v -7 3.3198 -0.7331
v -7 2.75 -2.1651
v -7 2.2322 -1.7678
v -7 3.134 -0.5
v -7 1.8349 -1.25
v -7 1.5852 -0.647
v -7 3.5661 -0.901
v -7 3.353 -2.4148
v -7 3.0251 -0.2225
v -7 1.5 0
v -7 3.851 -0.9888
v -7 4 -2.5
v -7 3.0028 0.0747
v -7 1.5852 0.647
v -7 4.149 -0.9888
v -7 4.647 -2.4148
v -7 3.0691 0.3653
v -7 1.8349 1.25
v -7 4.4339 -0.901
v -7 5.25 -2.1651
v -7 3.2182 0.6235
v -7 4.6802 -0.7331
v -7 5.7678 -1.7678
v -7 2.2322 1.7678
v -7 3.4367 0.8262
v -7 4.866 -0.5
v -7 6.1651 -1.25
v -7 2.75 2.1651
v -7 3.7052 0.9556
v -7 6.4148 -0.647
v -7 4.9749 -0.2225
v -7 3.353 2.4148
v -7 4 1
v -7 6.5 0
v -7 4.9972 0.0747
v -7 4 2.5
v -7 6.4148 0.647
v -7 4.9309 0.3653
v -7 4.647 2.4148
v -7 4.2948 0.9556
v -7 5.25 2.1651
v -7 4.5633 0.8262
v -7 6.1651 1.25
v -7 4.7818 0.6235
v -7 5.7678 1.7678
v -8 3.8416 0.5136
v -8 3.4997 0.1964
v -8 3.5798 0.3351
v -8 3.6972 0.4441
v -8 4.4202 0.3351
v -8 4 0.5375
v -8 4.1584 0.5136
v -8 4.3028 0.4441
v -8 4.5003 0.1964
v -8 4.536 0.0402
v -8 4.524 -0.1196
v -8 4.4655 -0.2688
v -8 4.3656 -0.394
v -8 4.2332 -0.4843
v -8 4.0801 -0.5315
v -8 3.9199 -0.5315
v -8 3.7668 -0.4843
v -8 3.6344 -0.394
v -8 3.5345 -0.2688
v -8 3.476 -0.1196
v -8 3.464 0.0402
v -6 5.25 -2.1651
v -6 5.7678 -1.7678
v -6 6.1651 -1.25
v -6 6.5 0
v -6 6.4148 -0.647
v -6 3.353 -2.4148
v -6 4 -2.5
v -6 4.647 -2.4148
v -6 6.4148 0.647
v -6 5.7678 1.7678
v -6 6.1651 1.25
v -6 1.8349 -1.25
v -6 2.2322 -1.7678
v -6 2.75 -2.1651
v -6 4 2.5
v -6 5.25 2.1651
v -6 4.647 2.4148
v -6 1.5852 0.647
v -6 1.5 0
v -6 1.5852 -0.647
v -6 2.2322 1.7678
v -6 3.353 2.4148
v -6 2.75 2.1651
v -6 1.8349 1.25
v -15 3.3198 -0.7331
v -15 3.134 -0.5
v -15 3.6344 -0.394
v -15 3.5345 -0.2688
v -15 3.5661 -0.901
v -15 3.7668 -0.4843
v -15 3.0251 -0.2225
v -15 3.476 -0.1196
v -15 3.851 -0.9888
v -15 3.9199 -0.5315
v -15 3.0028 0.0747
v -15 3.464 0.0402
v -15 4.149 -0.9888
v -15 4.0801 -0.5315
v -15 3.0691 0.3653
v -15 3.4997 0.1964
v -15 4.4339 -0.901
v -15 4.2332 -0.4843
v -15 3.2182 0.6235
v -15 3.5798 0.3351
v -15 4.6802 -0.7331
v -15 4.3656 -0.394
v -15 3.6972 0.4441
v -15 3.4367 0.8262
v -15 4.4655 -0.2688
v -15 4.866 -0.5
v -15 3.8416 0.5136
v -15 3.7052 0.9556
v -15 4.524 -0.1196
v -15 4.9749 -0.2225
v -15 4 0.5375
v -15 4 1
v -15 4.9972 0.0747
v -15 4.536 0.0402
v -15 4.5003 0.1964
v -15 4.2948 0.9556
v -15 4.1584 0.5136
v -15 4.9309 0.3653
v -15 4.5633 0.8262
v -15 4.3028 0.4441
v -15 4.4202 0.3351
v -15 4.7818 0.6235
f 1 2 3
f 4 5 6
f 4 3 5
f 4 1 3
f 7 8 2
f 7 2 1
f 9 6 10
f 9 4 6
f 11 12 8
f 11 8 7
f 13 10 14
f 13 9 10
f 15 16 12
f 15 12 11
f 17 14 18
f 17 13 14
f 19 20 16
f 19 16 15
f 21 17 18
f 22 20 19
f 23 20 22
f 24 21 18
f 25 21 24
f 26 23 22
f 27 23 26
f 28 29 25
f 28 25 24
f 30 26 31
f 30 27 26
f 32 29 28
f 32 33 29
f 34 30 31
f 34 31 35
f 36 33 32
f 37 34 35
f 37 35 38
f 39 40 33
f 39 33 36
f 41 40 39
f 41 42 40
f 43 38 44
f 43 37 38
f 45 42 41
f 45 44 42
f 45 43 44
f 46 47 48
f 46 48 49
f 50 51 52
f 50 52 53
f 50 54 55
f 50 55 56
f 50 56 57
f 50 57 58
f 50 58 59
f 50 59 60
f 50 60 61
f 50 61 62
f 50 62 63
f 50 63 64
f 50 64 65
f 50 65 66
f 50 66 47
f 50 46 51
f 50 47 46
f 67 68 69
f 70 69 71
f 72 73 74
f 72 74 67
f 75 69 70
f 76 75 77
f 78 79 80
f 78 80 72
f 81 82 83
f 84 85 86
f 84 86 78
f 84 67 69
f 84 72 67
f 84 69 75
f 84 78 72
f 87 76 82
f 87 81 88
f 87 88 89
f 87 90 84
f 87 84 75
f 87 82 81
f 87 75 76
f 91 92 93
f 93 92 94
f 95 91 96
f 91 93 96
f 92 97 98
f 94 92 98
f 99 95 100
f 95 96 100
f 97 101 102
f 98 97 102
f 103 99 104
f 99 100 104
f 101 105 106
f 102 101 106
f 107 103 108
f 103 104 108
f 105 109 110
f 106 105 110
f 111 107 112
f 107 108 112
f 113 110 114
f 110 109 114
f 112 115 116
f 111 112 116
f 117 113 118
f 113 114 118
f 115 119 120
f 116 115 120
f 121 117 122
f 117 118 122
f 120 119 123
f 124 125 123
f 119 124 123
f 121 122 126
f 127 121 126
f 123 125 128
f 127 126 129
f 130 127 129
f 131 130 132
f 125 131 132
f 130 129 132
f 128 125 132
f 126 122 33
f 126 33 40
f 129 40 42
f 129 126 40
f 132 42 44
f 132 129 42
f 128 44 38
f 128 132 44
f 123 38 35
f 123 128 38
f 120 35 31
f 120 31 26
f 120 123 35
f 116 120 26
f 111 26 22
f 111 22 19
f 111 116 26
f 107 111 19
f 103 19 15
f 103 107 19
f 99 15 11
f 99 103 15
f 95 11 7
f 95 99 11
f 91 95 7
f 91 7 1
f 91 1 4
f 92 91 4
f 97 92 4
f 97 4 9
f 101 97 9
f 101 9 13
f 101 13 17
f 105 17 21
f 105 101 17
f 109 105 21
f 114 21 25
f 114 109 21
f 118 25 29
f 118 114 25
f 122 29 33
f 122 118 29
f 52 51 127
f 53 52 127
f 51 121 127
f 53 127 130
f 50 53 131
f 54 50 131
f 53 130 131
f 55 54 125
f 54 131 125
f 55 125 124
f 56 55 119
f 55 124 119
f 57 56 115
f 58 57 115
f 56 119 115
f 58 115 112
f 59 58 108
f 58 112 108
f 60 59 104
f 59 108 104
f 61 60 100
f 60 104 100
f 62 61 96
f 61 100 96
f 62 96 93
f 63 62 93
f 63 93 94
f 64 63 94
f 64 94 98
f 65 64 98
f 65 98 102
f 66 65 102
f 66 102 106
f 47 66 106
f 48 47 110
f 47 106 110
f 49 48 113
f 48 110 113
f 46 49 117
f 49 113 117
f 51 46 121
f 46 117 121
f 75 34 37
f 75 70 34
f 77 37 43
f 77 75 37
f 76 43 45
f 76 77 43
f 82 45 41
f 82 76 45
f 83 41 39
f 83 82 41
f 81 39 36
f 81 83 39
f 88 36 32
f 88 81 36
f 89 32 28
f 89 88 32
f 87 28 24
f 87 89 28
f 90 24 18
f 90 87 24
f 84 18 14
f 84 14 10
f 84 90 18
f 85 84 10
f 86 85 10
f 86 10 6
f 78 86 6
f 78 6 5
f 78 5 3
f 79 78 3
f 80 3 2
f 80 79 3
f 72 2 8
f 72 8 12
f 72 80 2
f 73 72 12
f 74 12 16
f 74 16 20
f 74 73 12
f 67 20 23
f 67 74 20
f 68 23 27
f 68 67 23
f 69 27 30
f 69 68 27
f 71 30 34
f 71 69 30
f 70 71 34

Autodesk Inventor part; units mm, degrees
ref_plane "YZ Plane" through (0, 0, 0) normal (1, 0, 0) x (0, 1, 0)
ref_plane "XZ Plane" through (0, 0, 0) normal (0, 1, 0) x (-1, 0, 0)
ref_plane "XY Plane" through (0, 0, 0) normal (0, 0, 1) x (1, 0, 0)
sketch "Sketch1" plane through (0, 0, 0) normal (0, 1, 0) x (-1, 0, 0)
  arc A0 (0, -5) -> (0, 5) centre (0, 0) ccw
  line L0 (0, 5) -> (0, -5)
  dimension "d0" = 10
extrude "Extrusion1" add sketch "Sketch1" along normal blind 10
sketch "Sketch2" plane through (0, 0, 0) normal (1, 0, 0) x (0, 1, 0)
  line L0 (8.0172, -4.5) -> (8.0172, 4.5)
  line L1 (8.0172, 4.5) -> (2.5172, 4.5)
  line L2 (2.5172, -4.5) -> (0.0172, -2)
  line L3 (2.5172, 4.5) -> (0.0172, 2)
  line L4 (0.0172, -2) -> (0.0172, 2)
  line L5 (8.0172, -4.5) -> (2.5172, -4.5)
  point P0 (0, 0)
  dimension "d3" = 9
  dimension "d4" = 8
sketch "Sketch3" plane through (0, 0, 0) normal (1, 0, 0) x (0, 1, 0)
  line L0 (0, 2) -> (3, 5)
  arc A0 (3, 5) -> (0, 2) centre (1, 4) ccw
  line L1 (0, -2) -> (4, -6)
  arc A1 (0, -2) -> (4, -6) centre (1.75, -4.25) ccw
  line L2 (8.0325, 5) -> (11, 5)
  line L3 (11, 5) -> (11, -6)
  line L4 (11, -6) -> (8.0325, -6)
  line L5 (8.0325, -6) -> (8.0325, 5)
  line L6 (2.4911, 4.4911) -> (5, 7)
  line L7 (2.4911, 4.4911) -> (8.0325, 4.4911)
  arc A2 (8.0325, 4.4911) -> (5, 7) centre (7, 6.3303) ccw
  line L8 (2.4911, -4.4911) -> (8.5706, -4.4911)
  arc A3 (2.4911, -4.4911) -> (8.5706, -4.4911) centre (5.5309, -7.5041) ccw
  point P0 (0, 0)
extrude "Extrusion2" cut sketch "Sketch3" against normal through all
sketch "Sketch4" plane through (0, 0, 0) normal (0, 1, 0) x (-1, 0, 0)
  arc A0 (1.0726, -4.4911) -> (1.0726, 4.4911) centre (-1.125, 0) ccw
  arc A1 (1.0726, 4.4911) -> (1.0726, -4.4911) centre (-0.4517, 0) ccw
  point P0 (0, 0)
  point P1 (2.1976, -4.4911)
  point P2 (2.1976, 4.4911)
  dimension "d9" = 1.125
  dimension "d10" = 1.125
extrude "Extrusion3" cut sketch "Sketch4" along normal through all both and the other way through all
sketch "Sketch5" plane through (0, 0, 0) normal (1, 0, 0) x (0, 1, 0)
  line L0 (1.6, -1.2445) -> (1.6, 1.1555)
  line L1 (6.4325, 2.6911) -> (3.1125, 2.6911)
  line L2 (6.4325, -2.6911) -> (6.4325, 2.6911)
  line L3 (6.4325, -2.6911) -> (3.1125, -2.6911)
  line L4 (0, 2) -> (0, -2) projected
  line L5 (8.0325, 4.4911) -> (8.0325, -4.4911) projected
  line L6 (0, 2) -> (2.4911, 4.4911) projected
  line L7 (2.4911, 4.4911) -> (8.0325, 4.4911) projected
  line L8 (8.0325, 4.4911) -> (8.0325, -4.4911) projected
  line L9 (8.0325, -4.4911) -> (2.4911, -4.4911) projected
  line L10 (2.4911, -4.4911) -> (0, -2) projected
  line L11 (0, 2) -> (0, -2) projected
  line L12 (1.6, 1.1555) -> (3.1125, 2.6911)
  line L13 (1.6, -1.2445) -> (3.1125, -2.6911)
  line L14 (1.6, 4.6579) -> (1.6, -5.3823)
  arc A0 (1.6, 4.6579) -> (1.6, -5.3823) centre (3.2437, -0.3622) ccw
  line L15 (1.6, 1.1555) -> (5.4757, 5.0906)
  line L16 (1.6, 1.1555) -> (1.6, 7.5999)
  arc A1 (5.4757, 5.0906) -> (1.6, 7.5999) centre (3.8837, 6.8794) ccw
  line L17 (3.1125, 2.6911) -> (12.4034, 2.6911)
  line L18 (3.1125, 2.6911) -> (8.5318, 8.1936)
  arc A2 (12.4034, 2.6911) -> (8.5318, 8.1936) centre (8.3272, 3.9364) ccw
  line L19 (6.4325, 2.6911) -> (13.6333, 2.6911)
  line L20 (6.4325, 2.6911) -> (6.4325, -9.3636)
  arc A3 (6.4325, -9.3636) -> (13.6333, 2.6911) centre (6.37, -1.1482) ccw
  line L21 (6.4325, -2.6911) -> (6.4325, -11.5775)
  line L22 (6.4325, -2.6911) -> (3.1125, -2.6911)
  line L23 (3.1125, -2.6911) -> (3.2437, -12.8567)
  arc A4 (3.2437, -12.8567) -> (6.4325, -9.3636) centre (5.6123, -11.8169) ccw
  line L24 (1.6, -1.2445) -> (1.6, -8.2222)
  line L25 (1.6, -1.2445) -> (3.1125, -2.6911)
  line L26 (3.1125, -2.6911) -> (3.1946, -9.0574)
  arc A5 (1.6, -8.2222) -> (3.1946, -9.0574) centre (2.6381, -8.1801) ccw
  point P0 (0, 0)
  dimension "d16" = 1.6
  dimension "d18" = 1.6
  dimension "d21" = 1.8
  dimension "d23" = 1.8
  dimension "d24" = 2.4
  dimension "d26" = 3.32
  dimension "d27" = 3.32
extrude "Extrusion4" cut sketch "Sketch5" against normal through all contours L14 L10 L4 L6 L0 | L13 L23 L9 L10 L14 | L14 L6 L7 L15 L12 | L3 L20 L9 L23 | L14 A0 L6 L4 L10 | L10 L9 L23 A5 L24 L14 | L15 L7 L5 L17 L1 | L14 L16 A1 L15 L7 L6 | L2 L17 L5 L9 L20 | L9 L20 A4 L23 | L15 L18 A2 L17 L5 L7 | L9 L5 L17 L19 A3 L20
sketch "Sketch6" plane through (0, 0, 0) normal (1, 0, 0) x (0, 1, 0)
  circle A0 centre (4, 0) radius 2.5
  line L0 (1.6, -1.2445) -> (1.6, 1.1555) projected
  point P0 (0, 0)
  dimension "d31" = 5
  dimension "d32" = 2.4
extrude "Extrusion5" add sketch "Sketch6" against normal blind 15
sketch "Sketch7" plane through (0, 0, 0) normal (0, 1, 0) x (-1, 0, 0)
  arc A0 (3.089, -2.6911) -> (3.7176, -1.2445) centre (-1.125, 0) ccw
  arc A1 (3.7397, 1.1555) -> (3.089, 2.6911) centre (-1.125, 0) ccw projected
  arc A2 (3.7176, -1.2445) -> (3.7397, 1.1555) centre (-1.125, 0) ccw
  arc A3 (3.089, 2.6911) -> (3.089, -2.6911) centre (1.3425, 0) ccw
  point P0 (0, 0)
extrude "Extrusion6" cut sketch "Sketch7" along normal through all
sketch "Sketch8" plane through (-15, 4, 0) normal (-1, 0, 0) x (0, 0, 1)
  circle A0 centre (0, 0) radius 0.5375
  point P0 (0, -4)
  dimension "d37" = 1.075
extrude "Extrusion7" cut sketch "Sketch8" against normal blind 7
sketch "Sketch9" plane through (0, 0, 0) normal (0, 1, 0) x (-1, 0, 0)
  line L0 (6, 3) -> (2, 3)
  line L1 (2, 3) -> (2, -3)
  line L2 (2, -3) -> (6, -3)
  line L3 (6, -3) -> (6, 3)
  point P0 (0, 0)
extrude "Extrusion8" cut sketch "Sketch9" along normal through all both and the other way through all
sketch "Sketch10" plane through (-15, 4, 0) normal (-1, 0, 0) x (0, 0, 1)
  circle A0 centre (0, 0) radius 1
  circle A1 centre (0, 0) radius 3.1623
  point P0 (0, -4)
extrude "Extrusion9" cut sketch "Sketch10" against normal blind 8
properties part number "flat_cranial_window_stabilizer_FAT_May1519"
